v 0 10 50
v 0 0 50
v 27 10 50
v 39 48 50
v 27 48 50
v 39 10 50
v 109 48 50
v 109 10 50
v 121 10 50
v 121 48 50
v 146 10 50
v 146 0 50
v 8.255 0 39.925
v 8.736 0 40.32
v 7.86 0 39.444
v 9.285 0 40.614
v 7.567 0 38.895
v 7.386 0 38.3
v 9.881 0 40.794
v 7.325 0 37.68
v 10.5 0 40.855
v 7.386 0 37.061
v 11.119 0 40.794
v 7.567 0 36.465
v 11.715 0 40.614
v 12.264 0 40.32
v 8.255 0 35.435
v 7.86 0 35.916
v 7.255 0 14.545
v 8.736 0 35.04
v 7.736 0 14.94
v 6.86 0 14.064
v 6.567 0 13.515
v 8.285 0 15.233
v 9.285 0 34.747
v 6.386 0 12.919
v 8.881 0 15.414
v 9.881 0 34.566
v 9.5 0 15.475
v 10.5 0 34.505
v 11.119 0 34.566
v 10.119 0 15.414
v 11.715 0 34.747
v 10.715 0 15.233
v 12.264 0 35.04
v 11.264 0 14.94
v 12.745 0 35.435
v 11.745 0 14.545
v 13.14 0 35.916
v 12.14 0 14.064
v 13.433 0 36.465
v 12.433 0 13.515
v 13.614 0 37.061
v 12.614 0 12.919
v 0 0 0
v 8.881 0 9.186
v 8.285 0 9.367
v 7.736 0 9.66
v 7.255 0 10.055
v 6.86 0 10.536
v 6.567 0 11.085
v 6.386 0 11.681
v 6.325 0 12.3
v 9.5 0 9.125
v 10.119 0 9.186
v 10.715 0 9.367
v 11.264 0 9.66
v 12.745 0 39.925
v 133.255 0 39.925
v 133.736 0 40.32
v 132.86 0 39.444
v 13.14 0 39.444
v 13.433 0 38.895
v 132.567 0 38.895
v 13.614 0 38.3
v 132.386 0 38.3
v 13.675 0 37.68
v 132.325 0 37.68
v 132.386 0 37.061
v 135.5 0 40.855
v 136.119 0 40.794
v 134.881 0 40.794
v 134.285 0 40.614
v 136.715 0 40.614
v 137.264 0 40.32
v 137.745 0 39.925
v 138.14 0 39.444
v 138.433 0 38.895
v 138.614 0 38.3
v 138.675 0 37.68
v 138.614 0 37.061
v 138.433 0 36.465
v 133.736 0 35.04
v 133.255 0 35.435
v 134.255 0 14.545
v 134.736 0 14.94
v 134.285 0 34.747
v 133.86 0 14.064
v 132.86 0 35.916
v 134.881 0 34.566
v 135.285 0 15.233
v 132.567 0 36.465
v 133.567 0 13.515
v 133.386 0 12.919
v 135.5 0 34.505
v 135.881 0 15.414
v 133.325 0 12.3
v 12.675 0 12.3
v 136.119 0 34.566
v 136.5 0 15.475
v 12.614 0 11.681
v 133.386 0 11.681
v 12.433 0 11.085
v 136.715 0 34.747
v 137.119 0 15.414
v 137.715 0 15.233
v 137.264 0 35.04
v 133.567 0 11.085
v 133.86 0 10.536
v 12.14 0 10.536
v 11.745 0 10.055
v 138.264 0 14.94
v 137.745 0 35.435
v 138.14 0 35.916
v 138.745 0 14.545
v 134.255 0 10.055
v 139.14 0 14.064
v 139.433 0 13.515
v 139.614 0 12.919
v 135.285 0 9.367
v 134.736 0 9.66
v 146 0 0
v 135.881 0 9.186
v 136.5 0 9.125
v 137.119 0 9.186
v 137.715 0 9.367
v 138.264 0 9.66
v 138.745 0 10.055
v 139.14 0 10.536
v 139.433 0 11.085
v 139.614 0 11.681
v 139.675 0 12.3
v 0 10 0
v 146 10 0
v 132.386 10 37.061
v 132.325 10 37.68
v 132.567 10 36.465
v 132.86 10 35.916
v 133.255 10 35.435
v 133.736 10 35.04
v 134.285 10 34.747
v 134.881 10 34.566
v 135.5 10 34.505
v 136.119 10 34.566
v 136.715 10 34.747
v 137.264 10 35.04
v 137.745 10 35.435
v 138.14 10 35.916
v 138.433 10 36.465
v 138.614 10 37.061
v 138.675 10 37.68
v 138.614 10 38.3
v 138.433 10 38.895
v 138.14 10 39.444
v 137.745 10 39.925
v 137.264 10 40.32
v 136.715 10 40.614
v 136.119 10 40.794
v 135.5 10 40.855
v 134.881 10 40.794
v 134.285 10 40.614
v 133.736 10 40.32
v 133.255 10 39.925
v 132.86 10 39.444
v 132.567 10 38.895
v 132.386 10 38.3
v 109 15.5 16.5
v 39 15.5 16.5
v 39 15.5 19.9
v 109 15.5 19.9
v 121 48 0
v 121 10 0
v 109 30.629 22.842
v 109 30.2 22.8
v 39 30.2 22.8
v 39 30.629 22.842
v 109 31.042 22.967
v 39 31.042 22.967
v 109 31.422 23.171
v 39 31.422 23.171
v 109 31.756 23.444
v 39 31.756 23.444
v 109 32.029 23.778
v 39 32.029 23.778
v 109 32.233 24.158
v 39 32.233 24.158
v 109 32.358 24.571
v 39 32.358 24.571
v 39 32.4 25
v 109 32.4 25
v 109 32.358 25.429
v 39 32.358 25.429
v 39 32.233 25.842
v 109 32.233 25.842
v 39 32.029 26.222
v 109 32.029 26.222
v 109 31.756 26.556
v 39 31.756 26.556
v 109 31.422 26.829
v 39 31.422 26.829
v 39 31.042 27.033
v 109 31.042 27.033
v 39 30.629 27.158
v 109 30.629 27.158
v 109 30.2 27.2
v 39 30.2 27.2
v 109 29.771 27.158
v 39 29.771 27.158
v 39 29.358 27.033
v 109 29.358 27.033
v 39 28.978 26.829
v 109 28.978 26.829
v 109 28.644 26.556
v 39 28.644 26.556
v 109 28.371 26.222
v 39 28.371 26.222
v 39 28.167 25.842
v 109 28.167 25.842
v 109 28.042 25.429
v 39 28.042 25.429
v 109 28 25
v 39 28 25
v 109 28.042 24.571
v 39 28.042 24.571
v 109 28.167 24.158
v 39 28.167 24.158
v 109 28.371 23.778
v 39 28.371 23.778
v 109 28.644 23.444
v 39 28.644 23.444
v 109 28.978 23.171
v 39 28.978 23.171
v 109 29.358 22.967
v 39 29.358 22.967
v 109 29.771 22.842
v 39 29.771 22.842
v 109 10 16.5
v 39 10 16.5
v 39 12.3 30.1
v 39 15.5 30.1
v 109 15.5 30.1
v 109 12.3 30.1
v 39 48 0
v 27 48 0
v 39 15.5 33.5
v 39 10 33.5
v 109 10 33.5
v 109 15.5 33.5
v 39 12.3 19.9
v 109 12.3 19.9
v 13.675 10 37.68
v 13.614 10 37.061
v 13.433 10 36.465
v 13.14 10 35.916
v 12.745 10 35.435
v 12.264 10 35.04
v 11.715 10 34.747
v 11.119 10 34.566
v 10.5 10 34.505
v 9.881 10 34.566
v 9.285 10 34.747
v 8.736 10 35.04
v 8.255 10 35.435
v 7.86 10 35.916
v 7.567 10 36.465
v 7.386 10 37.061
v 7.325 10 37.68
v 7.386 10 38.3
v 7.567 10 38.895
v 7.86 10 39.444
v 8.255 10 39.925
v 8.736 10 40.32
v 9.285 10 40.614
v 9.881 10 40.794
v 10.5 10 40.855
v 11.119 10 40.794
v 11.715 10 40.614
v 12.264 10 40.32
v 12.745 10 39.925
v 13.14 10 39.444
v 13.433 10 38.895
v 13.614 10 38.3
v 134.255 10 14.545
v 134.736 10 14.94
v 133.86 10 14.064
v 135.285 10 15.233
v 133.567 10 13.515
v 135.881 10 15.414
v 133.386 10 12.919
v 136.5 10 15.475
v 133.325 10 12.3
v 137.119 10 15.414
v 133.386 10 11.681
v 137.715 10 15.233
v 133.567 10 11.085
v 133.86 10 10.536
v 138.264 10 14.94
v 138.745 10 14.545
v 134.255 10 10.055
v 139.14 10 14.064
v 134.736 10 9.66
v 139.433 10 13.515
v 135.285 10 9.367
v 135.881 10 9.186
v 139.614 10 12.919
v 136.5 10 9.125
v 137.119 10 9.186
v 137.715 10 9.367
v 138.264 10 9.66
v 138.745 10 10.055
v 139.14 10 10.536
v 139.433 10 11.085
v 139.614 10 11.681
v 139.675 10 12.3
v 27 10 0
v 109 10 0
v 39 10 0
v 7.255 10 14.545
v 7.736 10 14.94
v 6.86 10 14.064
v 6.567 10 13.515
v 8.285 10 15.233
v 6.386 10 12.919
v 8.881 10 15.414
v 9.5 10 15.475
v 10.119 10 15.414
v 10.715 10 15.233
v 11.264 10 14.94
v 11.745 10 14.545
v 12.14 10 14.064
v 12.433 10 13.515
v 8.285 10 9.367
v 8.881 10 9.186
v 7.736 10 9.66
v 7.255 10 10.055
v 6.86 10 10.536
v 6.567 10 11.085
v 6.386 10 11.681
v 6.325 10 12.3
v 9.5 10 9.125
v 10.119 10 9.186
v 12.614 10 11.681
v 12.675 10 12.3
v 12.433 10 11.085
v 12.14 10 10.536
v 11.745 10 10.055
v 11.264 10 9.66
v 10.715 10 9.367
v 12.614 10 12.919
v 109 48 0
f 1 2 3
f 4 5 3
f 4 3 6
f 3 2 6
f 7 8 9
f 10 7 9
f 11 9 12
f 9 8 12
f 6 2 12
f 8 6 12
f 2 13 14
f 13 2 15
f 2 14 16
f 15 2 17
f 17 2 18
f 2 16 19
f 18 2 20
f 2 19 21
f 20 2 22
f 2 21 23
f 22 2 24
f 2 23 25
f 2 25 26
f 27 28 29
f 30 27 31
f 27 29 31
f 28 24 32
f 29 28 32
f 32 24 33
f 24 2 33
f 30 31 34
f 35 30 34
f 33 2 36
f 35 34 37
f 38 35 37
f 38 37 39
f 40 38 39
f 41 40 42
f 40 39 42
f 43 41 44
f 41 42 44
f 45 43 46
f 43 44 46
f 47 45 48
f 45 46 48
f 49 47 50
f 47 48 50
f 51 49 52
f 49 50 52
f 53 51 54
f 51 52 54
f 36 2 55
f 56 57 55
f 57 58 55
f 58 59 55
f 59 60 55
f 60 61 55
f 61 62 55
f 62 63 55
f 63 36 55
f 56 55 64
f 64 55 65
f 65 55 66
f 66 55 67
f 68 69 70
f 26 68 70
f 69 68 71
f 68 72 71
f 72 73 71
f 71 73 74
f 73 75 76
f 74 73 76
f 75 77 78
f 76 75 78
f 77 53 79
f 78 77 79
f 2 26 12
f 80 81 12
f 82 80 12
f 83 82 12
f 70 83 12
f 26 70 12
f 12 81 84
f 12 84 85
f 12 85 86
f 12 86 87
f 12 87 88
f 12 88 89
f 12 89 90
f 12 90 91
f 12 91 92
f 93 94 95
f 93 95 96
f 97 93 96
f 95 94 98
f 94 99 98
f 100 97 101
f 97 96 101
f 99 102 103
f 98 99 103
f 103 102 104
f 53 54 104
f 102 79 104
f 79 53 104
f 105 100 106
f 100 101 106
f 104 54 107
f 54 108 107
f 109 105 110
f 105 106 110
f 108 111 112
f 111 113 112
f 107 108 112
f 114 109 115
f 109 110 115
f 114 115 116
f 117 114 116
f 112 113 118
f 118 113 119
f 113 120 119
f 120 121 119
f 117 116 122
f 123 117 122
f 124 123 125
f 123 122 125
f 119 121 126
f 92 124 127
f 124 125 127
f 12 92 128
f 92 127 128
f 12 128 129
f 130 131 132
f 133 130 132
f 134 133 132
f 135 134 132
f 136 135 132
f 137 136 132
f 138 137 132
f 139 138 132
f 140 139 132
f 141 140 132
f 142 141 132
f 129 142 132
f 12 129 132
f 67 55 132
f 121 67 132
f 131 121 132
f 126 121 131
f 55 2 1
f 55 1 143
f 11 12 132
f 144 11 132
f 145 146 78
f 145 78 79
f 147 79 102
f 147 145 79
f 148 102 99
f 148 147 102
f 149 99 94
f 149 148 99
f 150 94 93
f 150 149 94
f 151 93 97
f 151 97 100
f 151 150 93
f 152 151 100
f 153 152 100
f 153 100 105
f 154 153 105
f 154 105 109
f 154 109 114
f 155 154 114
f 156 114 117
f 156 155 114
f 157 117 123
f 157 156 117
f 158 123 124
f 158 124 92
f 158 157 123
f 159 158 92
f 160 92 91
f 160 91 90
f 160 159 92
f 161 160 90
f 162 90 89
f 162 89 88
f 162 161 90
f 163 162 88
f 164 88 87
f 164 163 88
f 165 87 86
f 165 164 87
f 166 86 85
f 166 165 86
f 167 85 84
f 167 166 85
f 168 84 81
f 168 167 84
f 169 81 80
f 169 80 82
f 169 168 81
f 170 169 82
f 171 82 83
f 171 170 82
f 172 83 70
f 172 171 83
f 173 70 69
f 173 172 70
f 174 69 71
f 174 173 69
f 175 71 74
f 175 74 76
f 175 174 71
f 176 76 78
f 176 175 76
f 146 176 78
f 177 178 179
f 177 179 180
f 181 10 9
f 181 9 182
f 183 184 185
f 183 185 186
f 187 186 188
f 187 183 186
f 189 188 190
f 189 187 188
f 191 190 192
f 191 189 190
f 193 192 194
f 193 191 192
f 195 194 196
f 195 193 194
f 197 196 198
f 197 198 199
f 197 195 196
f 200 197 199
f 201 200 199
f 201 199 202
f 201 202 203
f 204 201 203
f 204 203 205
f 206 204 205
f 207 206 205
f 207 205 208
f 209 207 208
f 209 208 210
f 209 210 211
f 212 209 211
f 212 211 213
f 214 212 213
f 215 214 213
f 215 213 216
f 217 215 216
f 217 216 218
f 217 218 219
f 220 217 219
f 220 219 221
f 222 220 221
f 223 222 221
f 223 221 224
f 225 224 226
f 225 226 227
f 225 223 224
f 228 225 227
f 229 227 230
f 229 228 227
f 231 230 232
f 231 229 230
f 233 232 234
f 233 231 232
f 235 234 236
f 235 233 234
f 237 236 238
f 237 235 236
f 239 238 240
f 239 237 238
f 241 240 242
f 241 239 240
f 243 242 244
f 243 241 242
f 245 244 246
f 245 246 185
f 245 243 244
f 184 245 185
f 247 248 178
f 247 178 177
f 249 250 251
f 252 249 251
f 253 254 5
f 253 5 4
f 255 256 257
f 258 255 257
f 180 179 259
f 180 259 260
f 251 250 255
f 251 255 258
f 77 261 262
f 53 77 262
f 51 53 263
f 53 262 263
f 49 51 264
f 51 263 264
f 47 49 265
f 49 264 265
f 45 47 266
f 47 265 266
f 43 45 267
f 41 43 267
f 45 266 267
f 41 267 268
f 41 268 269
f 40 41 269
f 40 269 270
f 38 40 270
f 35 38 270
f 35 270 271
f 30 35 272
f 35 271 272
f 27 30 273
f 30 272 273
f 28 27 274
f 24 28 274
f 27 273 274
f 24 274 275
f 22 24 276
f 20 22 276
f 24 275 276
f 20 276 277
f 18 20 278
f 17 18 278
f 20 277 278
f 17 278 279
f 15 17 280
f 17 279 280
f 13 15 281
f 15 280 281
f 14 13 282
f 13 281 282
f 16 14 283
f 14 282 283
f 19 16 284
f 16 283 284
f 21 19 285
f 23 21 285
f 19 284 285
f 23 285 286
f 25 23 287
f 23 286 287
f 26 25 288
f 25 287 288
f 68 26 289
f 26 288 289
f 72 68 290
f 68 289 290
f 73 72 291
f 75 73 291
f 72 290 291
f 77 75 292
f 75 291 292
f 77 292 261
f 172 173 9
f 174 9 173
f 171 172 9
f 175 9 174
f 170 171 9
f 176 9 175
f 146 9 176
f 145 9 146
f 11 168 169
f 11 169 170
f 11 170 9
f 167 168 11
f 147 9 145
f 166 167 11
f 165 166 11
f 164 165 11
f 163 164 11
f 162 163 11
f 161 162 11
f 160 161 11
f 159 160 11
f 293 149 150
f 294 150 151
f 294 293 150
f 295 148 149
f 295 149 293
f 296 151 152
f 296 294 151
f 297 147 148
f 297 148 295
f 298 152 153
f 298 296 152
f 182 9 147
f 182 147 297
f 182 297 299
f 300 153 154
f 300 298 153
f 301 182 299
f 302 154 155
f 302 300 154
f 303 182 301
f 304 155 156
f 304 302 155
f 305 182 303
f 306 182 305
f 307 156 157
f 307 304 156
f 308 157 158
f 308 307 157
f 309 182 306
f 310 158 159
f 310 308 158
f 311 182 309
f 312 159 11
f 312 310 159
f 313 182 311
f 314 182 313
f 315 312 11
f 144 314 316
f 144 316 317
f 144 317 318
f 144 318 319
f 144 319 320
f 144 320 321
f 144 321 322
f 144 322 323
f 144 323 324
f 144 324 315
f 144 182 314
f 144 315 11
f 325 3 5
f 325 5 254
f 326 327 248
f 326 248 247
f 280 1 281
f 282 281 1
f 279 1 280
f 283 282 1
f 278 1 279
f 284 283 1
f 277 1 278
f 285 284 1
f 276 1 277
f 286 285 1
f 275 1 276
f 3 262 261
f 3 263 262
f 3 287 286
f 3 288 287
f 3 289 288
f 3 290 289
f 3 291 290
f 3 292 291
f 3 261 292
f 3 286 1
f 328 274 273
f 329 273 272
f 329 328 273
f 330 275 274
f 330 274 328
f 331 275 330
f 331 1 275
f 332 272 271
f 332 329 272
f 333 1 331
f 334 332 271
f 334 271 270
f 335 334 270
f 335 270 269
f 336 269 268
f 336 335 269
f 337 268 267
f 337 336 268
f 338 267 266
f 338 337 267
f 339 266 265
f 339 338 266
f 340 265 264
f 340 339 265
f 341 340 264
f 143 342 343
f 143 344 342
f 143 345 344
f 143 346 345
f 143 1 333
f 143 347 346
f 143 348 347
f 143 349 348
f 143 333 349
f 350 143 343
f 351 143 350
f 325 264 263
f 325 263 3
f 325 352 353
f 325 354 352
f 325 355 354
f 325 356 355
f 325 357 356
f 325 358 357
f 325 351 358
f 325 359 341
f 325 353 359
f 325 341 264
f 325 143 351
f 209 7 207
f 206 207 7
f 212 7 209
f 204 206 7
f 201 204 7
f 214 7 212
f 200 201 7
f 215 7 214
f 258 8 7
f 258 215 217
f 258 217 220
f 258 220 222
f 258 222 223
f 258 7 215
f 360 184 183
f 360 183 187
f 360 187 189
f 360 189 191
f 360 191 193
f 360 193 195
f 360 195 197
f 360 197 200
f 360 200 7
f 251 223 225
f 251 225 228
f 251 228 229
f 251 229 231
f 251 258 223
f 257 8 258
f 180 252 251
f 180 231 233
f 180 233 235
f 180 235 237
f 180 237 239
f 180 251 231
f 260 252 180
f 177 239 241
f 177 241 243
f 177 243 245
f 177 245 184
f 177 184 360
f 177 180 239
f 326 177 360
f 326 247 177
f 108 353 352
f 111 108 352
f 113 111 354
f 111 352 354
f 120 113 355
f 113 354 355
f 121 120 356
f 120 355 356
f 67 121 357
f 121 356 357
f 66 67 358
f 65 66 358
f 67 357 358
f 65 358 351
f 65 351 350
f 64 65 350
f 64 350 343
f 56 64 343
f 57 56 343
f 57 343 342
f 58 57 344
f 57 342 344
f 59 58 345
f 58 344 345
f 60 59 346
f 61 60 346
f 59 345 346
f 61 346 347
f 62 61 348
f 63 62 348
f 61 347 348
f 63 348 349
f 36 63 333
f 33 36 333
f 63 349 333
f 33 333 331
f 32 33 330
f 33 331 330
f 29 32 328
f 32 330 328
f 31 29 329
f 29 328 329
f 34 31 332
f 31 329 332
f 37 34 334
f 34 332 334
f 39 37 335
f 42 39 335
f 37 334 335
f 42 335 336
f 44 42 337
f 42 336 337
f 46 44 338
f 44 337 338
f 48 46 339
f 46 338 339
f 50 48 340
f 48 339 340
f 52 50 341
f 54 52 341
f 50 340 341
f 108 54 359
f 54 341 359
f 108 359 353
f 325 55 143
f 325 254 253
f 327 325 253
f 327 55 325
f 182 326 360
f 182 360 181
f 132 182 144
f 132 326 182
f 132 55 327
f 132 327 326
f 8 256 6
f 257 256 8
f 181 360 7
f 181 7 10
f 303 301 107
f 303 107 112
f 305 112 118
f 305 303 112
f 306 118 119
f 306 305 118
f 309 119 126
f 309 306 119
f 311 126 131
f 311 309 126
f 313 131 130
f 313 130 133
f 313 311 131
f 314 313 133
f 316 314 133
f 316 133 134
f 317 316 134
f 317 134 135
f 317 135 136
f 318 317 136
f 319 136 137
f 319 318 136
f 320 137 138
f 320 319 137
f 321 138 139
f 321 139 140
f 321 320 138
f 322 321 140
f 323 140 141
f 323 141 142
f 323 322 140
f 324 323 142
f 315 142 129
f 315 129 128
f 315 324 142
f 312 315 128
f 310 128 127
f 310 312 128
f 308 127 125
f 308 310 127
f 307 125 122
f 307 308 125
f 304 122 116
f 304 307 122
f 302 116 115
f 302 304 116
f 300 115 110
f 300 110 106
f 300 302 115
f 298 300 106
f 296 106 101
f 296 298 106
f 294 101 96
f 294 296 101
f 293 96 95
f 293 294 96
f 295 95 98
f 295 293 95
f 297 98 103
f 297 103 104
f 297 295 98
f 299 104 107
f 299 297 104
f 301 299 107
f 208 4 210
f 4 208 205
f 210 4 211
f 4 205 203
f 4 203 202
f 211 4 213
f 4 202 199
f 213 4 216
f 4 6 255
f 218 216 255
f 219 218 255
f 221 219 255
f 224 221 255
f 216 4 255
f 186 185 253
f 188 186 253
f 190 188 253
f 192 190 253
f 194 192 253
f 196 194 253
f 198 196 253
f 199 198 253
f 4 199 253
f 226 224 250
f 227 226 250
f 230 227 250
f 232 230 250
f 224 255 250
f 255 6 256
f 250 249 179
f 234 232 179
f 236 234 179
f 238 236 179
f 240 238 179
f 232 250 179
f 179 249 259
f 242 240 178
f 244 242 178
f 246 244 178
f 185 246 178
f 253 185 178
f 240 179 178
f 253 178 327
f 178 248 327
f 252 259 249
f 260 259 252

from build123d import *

# Parameters (mm, degrees)
SKETCH1_W           = 146
SKETCH1_H           = 50
BOSS_EXTRUDE1_DEPTH = 10
SKETCH2_R           = 3.175
CUT_EXTRUDE1_DEPTH  = 10
SKETCH3_W           = 12
SKETCH3_H           = 50
BOSS_EXTRUDE2_DEPTH = 38
SKETCH4_R           = 2.2
BOSS_EXTRUDE3_DEPTH = 82
SKETCH5_W           = 70
SKETCH5_H           = 17
BOSS_EXTRUDE4_DEPTH = 5.5
SKETCH6_W           = 70
SKETCH6_H           = 10.2
CUT_EXTRUDE2_DEPTH  = 3.2


with BuildPart() as part:
    # Sketch1 → Boss-Extrude1 (new body)
    with BuildSketch(Plane(origin=(0, 0, 0), x_dir=(1, 0, 0), z_dir=(0, 1, 0))):
        with Locations((73, -25)):
            Rectangle(SKETCH1_W, SKETCH1_H)
    extrude(amount=BOSS_EXTRUDE1_DEPTH)

    # Sketch2 → Cut-Extrude1 (cut)
    with BuildSketch(Plane(origin=(0, 10, 0), x_dir=(1, 0, 0), z_dir=(0, 1, 0))):
        with Locations((9.5, -12.3)):
            Circle(SKETCH2_R)
        with Locations((10.5, -37.680307327)):
            Circle(SKETCH2_R)
    cut_extrude1 = extrude(amount=-CUT_EXTRUDE1_DEPTH, mode=Mode.SUBTRACT)

    # Mirror1: Cut-Extrude1 across plane
    add(cut_extrude1.mirror(Plane.ZY.offset(-73)), mode=Mode.SUBTRACT)

    # Sketch3 → Boss-Extrude2 (add)
    with BuildSketch(Plane(origin=(0, 10, 0), x_dir=(1, 0, 0), z_dir=(0, 1, 0))):
        with Locations((115, -25)):
            Rectangle(SKETCH3_W, SKETCH3_H)
        with Locations((33, -25)):
            Rectangle(SKETCH3_W, SKETCH3_H)
    extrude(amount=BOSS_EXTRUDE2_DEPTH)

    # Sketch4 → Boss-Extrude3 (add)
    with BuildSketch(Plane(origin=(121, 0, 0), x_dir=(0, 0, -1), z_dir=(1, 0, 0))):
        with Locations((-25, 30.2)):
            Circle(SKETCH4_R)
    extrude(amount=-BOSS_EXTRUDE3_DEPTH)

    # Sketch5 → Boss-Extrude4 (add)
    with BuildSketch(Plane(origin=(0, 10, 0), x_dir=(1, 0, 0), z_dir=(0, 1, 0))):
        with Locations((74, -25)):
            Rectangle(SKETCH5_W, SKETCH5_H)
    extrude(amount=BOSS_EXTRUDE4_DEPTH)

    # Sketch6 → Cut-Extrude2 (cut)
    with BuildSketch(Plane(origin=(0, 15.5, 0), x_dir=(1, 0, 0), z_dir=(0, 1, 0))):
        with Locations((74, -25)):
            Rectangle(SKETCH6_W, SKETCH6_H)
    extrude(amount=-CUT_EXTRUDE2_DEPTH, mode=Mode.SUBTRACT)


solid = part.part
